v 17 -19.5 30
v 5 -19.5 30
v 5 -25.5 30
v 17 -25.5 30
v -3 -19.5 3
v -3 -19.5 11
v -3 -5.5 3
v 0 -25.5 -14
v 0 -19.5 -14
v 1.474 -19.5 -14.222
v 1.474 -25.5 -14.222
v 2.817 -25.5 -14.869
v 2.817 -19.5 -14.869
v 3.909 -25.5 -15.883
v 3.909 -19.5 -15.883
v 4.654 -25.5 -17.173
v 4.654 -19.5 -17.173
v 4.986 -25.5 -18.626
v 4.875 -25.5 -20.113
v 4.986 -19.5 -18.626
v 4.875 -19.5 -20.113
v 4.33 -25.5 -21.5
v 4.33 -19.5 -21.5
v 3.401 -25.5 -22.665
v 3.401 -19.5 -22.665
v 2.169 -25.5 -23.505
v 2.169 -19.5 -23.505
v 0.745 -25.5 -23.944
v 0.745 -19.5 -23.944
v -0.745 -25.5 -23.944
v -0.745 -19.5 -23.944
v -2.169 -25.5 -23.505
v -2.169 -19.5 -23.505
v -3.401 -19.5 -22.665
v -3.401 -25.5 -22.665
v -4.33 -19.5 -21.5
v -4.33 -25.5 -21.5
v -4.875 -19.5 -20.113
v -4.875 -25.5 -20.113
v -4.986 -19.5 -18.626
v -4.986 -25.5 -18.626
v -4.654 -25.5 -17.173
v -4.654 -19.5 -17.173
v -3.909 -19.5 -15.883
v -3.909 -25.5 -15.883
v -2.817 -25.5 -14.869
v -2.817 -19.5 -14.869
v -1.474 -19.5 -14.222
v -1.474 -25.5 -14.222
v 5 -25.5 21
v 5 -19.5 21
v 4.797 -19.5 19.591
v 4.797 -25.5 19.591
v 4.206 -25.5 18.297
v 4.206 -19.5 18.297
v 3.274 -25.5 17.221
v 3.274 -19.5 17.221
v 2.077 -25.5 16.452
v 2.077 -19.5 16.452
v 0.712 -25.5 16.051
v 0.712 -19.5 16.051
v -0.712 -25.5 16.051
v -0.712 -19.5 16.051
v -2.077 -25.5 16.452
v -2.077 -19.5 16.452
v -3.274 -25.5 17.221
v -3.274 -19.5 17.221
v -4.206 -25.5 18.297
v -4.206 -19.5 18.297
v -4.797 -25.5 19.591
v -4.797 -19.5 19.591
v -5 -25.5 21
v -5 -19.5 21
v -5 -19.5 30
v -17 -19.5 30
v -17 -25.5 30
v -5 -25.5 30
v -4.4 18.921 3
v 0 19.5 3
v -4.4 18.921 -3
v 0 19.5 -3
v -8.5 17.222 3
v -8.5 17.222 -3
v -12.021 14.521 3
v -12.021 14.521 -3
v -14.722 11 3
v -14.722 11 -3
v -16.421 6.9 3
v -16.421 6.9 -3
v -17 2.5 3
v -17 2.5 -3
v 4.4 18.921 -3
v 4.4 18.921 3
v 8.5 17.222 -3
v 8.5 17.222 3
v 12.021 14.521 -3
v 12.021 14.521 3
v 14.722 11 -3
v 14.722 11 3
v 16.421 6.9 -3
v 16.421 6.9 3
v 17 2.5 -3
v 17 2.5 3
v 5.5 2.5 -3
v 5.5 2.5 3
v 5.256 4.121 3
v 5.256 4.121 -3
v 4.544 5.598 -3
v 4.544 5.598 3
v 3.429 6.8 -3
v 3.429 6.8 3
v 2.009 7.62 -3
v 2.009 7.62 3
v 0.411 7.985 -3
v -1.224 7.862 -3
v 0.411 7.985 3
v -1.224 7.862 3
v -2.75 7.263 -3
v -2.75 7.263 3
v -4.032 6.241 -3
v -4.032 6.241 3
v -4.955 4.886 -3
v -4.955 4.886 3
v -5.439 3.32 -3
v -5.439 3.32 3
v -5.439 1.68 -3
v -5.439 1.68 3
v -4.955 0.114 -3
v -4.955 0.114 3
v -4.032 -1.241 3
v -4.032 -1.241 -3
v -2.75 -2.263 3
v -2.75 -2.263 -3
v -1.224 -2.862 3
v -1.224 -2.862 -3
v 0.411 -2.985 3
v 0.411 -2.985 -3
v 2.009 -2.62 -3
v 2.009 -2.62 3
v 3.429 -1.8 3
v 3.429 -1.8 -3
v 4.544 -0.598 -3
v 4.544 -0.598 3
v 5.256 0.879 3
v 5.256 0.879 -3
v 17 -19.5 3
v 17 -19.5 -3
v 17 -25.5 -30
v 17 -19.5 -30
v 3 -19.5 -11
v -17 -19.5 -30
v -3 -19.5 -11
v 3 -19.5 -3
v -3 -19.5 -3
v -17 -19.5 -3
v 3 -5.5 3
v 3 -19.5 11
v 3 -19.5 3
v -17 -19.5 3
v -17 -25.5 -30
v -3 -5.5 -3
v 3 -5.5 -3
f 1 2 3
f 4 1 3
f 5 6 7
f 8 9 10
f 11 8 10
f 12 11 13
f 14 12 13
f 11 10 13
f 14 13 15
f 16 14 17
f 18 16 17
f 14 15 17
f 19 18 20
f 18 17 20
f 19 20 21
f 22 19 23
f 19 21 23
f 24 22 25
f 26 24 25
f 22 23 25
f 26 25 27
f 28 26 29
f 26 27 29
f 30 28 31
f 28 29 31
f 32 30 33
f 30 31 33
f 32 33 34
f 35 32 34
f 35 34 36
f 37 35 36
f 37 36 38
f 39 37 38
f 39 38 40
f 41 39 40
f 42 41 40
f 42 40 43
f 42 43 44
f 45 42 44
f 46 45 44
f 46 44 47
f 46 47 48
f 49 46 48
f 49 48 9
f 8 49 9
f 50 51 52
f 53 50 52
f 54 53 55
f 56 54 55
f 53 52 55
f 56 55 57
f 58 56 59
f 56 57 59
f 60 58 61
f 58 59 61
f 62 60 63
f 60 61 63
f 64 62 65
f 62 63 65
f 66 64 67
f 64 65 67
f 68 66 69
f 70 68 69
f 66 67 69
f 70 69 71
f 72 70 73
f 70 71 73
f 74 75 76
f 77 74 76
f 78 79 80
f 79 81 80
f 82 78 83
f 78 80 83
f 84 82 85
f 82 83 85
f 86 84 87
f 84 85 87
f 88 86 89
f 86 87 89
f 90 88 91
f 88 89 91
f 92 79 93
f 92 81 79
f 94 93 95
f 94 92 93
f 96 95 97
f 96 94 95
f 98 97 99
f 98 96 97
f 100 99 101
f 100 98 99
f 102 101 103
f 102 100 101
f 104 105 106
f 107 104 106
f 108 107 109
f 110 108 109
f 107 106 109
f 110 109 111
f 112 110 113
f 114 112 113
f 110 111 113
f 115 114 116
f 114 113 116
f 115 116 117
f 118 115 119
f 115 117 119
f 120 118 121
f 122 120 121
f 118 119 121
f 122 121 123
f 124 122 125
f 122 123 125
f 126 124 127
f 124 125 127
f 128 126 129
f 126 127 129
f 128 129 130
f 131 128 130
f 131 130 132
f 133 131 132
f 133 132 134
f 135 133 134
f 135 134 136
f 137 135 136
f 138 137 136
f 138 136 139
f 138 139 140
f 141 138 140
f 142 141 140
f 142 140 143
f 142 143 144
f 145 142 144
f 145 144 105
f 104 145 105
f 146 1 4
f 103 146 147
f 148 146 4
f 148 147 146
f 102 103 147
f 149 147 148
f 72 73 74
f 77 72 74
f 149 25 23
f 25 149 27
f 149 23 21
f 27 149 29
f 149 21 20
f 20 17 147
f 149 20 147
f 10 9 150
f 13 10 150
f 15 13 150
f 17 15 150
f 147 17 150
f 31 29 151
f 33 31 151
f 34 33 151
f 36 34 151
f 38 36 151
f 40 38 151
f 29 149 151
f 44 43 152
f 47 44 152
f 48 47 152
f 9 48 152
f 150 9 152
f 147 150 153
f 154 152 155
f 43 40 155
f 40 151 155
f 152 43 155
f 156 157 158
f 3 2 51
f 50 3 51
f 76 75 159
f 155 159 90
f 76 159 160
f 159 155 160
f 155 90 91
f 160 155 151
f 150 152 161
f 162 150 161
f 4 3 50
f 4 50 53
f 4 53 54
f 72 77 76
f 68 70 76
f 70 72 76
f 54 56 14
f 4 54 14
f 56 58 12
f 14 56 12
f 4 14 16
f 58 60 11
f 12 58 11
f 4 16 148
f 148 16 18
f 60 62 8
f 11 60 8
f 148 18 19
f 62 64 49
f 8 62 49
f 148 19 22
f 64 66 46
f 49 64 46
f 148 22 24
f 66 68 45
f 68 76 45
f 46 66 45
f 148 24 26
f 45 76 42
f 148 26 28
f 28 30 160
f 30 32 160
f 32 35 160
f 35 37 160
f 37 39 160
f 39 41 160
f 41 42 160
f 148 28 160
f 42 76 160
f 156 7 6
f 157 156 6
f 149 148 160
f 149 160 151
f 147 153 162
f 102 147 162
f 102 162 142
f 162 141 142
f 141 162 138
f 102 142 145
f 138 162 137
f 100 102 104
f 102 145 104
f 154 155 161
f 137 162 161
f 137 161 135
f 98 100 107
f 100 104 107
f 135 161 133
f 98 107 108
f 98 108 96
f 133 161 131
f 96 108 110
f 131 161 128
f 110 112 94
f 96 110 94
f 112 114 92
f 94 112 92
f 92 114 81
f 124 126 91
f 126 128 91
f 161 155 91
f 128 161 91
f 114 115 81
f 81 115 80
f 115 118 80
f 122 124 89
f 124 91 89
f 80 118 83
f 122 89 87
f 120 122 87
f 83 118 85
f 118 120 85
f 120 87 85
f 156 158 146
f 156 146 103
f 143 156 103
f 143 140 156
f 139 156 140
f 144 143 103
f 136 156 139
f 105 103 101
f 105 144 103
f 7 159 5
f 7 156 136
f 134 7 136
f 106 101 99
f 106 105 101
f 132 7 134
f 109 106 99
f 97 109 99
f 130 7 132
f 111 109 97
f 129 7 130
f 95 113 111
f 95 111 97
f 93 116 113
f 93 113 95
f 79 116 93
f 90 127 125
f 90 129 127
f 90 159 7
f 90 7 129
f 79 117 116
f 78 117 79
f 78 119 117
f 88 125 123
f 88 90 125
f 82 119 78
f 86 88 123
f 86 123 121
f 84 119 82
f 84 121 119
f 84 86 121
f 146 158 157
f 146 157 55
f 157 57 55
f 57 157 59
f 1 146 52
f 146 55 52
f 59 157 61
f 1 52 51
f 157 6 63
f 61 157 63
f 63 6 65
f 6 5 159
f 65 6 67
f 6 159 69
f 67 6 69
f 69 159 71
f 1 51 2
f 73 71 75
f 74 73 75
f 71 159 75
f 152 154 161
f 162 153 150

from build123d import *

# Parameters (mm, degrees)
EXTRUDE_1_DEPTH      = 17
EXTRUDE_1_DEPTH_BACK = 17
SKETCH_1_W           = 6
SKETCH_1_H           = 39
FILLET_1_R           = 17
SKETCH_2_R           = 5.5
CUT_EXTRUDE_1_DEPTH  = 46.036096634
EXTRUDE_2_DEPTH      = 3
EXTRUDE_2_DEPTH_BACK = 3
SKETCH_3_R           = 5
CUT_EXTRUDE_2_DEPTH  = 53.057660339


with BuildPart() as part:
    # Эскиз1 → Бобышка-Вытянуть1 (new, two sides: drawn at the far end of the back side and taken through both)
    with BuildSketch(Plane(origin=(0, 0, 0), x_dir=(0, 0, -1), z_dir=(1, 0, 0)).offset(-EXTRUDE_1_DEPTH_BACK)):
        Rectangle(SKETCH_1_W, SKETCH_1_H)
        Polygon((-3, -19.5), (-11, -19.5), (-30, -19.5), (-30, -25.5), (30, -25.5), (30, -19.5), (11, -19.5), (3, -19.5), align=None)
    extrude(amount=EXTRUDE_1_DEPTH + EXTRUDE_1_DEPTH_BACK)

    # Скругление1
    fillet_1_edges = [part.edges().sort_by_distance(p)[0] for p in [
        (17, 19.5, 0),
        (-17, 19.5, 0),
    ]]
    fillet(fillet_1_edges, radius=FILLET_1_R - 0.0001)  # a hair under: the kernel refuses the full size

    # Эскиз2 → Вырез-Вытянуть1 (cut, through all)
    with BuildSketch(Plane.XY.offset(3)):
        with Locations((0, 2.5)):
            Circle(SKETCH_2_R)
    extrude(amount=-CUT_EXTRUDE_1_DEPTH, mode=Mode.SUBTRACT)

    # Эскиз1<3> → Бобышка-Вытянуть2 (add, two sides: drawn at the far end of the back side and taken through both)
    with BuildSketch(Plane(origin=(0, 0, 0), x_dir=(0, 0, -1), z_dir=(1, 0, 0)).offset(-EXTRUDE_2_DEPTH_BACK)):
        Polygon((-3, -5.5), (-11, -19.5), (-3, -19.5), align=None)
        Polygon((3, -5.5), (3, -19.5), (11, -19.5), align=None)
    extrude(amount=EXTRUDE_2_DEPTH + EXTRUDE_2_DEPTH_BACK)

    # Эскиз3 → Вырез-Вытянуть2 (cut, through all)
    with BuildSketch(Plane(origin=(0, -19.5, 0), x_dir=(1, 0, 0), z_dir=(0, 1, 0))):
        with Locations(Location((0, 19, 0), (0, 0, 270))):
            Circle(SKETCH_3_R)
        with Locations((0, -21)):
            Circle(SKETCH_3_R)
        with BuildLine():
            ThreePointArc((5, -21), (0, -26), (-5, -21))
            Line((-5, -21), (-5, -30))
            Line((-5, -30), (5, -30))
            Line((5, -30), (5, -21))
        make_face()
    extrude(amount=-CUT_EXTRUDE_2_DEPTH, mode=Mode.SUBTRACT)


solid = part.part
